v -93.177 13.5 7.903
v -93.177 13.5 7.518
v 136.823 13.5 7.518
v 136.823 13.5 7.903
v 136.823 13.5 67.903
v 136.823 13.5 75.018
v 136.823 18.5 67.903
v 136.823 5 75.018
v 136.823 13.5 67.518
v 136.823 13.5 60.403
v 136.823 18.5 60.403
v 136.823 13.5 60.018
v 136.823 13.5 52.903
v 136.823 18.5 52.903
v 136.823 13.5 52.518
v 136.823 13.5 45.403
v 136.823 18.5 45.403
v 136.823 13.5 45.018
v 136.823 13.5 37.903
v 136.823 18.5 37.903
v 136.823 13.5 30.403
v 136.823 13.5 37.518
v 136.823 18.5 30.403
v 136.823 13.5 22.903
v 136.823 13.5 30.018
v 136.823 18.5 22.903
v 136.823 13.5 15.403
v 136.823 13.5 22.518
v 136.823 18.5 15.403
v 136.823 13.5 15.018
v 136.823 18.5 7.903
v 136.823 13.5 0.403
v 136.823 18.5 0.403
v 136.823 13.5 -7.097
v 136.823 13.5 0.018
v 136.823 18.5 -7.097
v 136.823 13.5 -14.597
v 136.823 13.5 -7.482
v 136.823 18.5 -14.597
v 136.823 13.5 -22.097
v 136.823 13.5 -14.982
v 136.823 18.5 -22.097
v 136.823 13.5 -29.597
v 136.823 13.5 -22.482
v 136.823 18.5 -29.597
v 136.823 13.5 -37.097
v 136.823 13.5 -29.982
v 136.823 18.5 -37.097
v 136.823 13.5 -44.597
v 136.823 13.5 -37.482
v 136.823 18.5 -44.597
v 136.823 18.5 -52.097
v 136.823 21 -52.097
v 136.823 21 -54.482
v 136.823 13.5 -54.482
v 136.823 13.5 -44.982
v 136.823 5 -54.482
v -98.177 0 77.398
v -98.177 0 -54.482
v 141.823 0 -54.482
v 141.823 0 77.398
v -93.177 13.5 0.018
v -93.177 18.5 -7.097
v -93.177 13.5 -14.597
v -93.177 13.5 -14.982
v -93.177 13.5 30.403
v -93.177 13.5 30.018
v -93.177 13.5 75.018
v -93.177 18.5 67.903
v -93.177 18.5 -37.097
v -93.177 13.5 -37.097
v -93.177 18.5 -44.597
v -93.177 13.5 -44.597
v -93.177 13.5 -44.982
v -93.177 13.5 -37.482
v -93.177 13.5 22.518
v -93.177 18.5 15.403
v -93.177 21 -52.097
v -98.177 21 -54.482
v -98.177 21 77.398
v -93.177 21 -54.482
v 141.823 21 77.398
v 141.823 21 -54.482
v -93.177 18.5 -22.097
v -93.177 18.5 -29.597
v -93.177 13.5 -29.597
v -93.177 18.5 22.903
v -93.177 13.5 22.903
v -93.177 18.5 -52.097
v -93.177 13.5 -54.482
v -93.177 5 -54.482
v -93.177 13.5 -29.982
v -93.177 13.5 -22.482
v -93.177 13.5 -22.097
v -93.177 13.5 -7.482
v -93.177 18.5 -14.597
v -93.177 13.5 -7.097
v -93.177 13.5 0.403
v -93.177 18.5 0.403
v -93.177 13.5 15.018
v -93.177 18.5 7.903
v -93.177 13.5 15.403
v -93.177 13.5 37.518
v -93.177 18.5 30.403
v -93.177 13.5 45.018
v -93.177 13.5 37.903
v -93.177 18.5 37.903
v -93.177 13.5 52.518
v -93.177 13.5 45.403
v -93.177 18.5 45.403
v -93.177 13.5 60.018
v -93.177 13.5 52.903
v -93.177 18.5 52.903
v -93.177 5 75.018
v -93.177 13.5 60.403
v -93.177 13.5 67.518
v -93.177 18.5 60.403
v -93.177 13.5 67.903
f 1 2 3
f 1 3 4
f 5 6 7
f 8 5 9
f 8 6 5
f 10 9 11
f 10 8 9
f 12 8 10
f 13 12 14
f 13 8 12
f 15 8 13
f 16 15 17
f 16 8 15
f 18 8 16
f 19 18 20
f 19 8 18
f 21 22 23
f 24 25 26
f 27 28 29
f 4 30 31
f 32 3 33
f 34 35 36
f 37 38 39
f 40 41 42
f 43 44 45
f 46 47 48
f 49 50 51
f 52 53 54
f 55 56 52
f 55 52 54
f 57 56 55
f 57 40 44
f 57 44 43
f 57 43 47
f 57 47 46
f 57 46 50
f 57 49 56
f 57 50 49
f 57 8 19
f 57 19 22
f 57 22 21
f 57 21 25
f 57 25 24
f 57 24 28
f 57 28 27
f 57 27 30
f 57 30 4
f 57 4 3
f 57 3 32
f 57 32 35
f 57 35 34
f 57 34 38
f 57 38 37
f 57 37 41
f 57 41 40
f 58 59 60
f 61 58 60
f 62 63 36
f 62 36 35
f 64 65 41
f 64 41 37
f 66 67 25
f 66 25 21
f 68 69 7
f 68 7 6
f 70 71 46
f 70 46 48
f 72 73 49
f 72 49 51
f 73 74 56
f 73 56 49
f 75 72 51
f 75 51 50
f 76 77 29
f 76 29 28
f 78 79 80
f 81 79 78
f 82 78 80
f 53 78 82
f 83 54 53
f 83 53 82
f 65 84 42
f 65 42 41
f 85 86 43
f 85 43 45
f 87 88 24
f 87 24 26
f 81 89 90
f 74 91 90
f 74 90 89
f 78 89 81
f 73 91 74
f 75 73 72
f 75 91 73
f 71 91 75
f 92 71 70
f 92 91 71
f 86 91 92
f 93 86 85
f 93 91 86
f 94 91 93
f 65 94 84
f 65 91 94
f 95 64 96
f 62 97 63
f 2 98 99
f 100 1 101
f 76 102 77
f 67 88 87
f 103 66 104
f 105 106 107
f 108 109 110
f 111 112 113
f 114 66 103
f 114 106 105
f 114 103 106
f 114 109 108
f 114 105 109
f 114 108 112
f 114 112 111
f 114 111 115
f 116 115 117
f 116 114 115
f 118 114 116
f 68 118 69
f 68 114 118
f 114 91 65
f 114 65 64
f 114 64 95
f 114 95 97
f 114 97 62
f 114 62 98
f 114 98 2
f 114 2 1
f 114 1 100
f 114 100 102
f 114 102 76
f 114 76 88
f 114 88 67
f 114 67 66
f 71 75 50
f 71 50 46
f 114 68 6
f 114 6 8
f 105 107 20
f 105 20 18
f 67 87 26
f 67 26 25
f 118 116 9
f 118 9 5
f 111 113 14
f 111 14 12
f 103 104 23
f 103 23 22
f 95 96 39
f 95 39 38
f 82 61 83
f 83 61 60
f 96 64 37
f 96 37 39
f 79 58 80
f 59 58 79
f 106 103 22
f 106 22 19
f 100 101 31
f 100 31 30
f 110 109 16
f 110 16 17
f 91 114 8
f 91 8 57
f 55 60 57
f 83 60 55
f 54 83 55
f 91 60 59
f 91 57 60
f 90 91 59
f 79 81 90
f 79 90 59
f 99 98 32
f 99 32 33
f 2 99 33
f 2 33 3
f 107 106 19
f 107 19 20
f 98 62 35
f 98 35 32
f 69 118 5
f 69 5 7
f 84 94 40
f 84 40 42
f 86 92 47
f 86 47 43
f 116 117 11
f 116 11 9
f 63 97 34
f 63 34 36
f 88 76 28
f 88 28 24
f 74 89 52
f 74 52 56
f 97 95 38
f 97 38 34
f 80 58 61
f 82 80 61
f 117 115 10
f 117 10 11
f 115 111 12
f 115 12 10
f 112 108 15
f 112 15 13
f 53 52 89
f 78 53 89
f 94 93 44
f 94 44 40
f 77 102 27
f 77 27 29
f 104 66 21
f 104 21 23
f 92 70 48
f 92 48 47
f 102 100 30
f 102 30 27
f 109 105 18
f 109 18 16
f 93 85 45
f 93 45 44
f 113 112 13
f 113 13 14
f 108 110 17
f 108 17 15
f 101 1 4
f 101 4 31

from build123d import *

# Parameters (mm, degrees)
SKETCH1_W           = 240
SKETCH1_H           = 351.15
BOSS_EXTRUDE3_DEPTH = 21
SKETCH5_W           = 248.975913499
SKETCH5_H           = 113.170869772
CUT_EXTRUDE5_DEPTH  = 254
CAVITY1_START       = -93.176553254
CAVITY1_DEPTH       = 230
SKETCH6_W           = 230
SKETCH6_H           = 2.384694545
CUT_EXTRUDE6_DEPTH  = 10


with BuildPart() as part:
    # Sketch1 → Boss-Extrude3 (new body)
    with BuildSketch(Plane(origin=(0, 0, 0), x_dir=(1, 0, 0), z_dir=(0, 1, 0))):
        with Locations((21.823446746, 98.176553254)):
            Rectangle(SKETCH1_W, SKETCH1_H)
    extrude(amount=BOSS_EXTRUDE3_DEPTH)

    # Sketch5 → Cut-Extrude5 (cut)
    with BuildSketch(Plane(origin=(0, 0, -54.481553254), x_dir=(-1, 0, 0), z_dir=(0, 0, -1))):
        with Locations((-20.8478358, 4.110963623)):
            Rectangle(SKETCH5_W, SKETCH5_H)
    extrude(amount=CUT_EXTRUDE5_DEPTH, mode=Mode.SUBTRACT)

    # Cavity1: read off the stored shape, not the designer's step
    # Cavity1 outline → Cavity1 (cut)
    with BuildSketch(Plane.YZ.offset(CAVITY1_START)):
        Polygon((18.5, 60.403141291), (13.5, 67.518446746), (13.5, 67.903141291), (18.5, 67.903141291), (13.5, 75.018446746), (5, 75.018446746), (5, -54.481553254), (13.5, -54.481553254), (13.5, -52.096858709), (18.5, -52.096858709), (13.5, -44.981553254), (13.5, -44.596858709), (18.5, -44.596858709), (13.5, -37.481553254), (13.5, -37.096858709), (18.5, -37.096858709), (13.5, -29.981553254), (13.5, -29.596858709), (18.5, -29.596858709), (13.5, -22.481553254), (13.5, -22.096858709), (18.5, -22.096858709), (13.5, -14.981553254), (13.5, -14.596858709), (18.5, -14.596858709), (13.5, -7.481553254), (13.5, -7.096858709), (18.5, -7.096858709), (13.5, 0.018446746), (13.5, 0.403141291), (18.5, 0.403141291), (13.5, 7.518446746), (13.5, 7.903141291), (18.5, 7.903141291), (13.5, 15.018446746), (13.5, 15.403141291), (18.5, 15.403141291), (13.5, 22.518446746), (13.5, 22.903141291), (18.5, 22.903141291), (13.5, 30.018446746), (13.5, 30.403141291), (18.5, 30.403141291), (13.5, 37.518446746), (13.5, 37.903141291), (18.5, 37.903141291), (13.5, 45.018446746), (13.5, 45.403141291), (18.5, 45.403141291), (13.5, 52.518446746), (13.5, 52.903141291), (18.5, 52.903141291), (13.5, 60.018446746), (13.5, 60.403141291), align=None)
    extrude(amount=CAVITY1_DEPTH, mode=Mode.SUBTRACT)

    # Sketch6 → Cut-Extrude6 (cut)
    with BuildSketch(Plane(origin=(0, 13.5, 0), x_dir=(-1, 0, 0), z_dir=(0, -1, 0))):
        with Locations((-21.823446746, 53.289205982)):
            Rectangle(SKETCH6_W, SKETCH6_H)
    extrude(amount=-CUT_EXTRUDE6_DEPTH, mode=Mode.SUBTRACT)


solid = part.part
